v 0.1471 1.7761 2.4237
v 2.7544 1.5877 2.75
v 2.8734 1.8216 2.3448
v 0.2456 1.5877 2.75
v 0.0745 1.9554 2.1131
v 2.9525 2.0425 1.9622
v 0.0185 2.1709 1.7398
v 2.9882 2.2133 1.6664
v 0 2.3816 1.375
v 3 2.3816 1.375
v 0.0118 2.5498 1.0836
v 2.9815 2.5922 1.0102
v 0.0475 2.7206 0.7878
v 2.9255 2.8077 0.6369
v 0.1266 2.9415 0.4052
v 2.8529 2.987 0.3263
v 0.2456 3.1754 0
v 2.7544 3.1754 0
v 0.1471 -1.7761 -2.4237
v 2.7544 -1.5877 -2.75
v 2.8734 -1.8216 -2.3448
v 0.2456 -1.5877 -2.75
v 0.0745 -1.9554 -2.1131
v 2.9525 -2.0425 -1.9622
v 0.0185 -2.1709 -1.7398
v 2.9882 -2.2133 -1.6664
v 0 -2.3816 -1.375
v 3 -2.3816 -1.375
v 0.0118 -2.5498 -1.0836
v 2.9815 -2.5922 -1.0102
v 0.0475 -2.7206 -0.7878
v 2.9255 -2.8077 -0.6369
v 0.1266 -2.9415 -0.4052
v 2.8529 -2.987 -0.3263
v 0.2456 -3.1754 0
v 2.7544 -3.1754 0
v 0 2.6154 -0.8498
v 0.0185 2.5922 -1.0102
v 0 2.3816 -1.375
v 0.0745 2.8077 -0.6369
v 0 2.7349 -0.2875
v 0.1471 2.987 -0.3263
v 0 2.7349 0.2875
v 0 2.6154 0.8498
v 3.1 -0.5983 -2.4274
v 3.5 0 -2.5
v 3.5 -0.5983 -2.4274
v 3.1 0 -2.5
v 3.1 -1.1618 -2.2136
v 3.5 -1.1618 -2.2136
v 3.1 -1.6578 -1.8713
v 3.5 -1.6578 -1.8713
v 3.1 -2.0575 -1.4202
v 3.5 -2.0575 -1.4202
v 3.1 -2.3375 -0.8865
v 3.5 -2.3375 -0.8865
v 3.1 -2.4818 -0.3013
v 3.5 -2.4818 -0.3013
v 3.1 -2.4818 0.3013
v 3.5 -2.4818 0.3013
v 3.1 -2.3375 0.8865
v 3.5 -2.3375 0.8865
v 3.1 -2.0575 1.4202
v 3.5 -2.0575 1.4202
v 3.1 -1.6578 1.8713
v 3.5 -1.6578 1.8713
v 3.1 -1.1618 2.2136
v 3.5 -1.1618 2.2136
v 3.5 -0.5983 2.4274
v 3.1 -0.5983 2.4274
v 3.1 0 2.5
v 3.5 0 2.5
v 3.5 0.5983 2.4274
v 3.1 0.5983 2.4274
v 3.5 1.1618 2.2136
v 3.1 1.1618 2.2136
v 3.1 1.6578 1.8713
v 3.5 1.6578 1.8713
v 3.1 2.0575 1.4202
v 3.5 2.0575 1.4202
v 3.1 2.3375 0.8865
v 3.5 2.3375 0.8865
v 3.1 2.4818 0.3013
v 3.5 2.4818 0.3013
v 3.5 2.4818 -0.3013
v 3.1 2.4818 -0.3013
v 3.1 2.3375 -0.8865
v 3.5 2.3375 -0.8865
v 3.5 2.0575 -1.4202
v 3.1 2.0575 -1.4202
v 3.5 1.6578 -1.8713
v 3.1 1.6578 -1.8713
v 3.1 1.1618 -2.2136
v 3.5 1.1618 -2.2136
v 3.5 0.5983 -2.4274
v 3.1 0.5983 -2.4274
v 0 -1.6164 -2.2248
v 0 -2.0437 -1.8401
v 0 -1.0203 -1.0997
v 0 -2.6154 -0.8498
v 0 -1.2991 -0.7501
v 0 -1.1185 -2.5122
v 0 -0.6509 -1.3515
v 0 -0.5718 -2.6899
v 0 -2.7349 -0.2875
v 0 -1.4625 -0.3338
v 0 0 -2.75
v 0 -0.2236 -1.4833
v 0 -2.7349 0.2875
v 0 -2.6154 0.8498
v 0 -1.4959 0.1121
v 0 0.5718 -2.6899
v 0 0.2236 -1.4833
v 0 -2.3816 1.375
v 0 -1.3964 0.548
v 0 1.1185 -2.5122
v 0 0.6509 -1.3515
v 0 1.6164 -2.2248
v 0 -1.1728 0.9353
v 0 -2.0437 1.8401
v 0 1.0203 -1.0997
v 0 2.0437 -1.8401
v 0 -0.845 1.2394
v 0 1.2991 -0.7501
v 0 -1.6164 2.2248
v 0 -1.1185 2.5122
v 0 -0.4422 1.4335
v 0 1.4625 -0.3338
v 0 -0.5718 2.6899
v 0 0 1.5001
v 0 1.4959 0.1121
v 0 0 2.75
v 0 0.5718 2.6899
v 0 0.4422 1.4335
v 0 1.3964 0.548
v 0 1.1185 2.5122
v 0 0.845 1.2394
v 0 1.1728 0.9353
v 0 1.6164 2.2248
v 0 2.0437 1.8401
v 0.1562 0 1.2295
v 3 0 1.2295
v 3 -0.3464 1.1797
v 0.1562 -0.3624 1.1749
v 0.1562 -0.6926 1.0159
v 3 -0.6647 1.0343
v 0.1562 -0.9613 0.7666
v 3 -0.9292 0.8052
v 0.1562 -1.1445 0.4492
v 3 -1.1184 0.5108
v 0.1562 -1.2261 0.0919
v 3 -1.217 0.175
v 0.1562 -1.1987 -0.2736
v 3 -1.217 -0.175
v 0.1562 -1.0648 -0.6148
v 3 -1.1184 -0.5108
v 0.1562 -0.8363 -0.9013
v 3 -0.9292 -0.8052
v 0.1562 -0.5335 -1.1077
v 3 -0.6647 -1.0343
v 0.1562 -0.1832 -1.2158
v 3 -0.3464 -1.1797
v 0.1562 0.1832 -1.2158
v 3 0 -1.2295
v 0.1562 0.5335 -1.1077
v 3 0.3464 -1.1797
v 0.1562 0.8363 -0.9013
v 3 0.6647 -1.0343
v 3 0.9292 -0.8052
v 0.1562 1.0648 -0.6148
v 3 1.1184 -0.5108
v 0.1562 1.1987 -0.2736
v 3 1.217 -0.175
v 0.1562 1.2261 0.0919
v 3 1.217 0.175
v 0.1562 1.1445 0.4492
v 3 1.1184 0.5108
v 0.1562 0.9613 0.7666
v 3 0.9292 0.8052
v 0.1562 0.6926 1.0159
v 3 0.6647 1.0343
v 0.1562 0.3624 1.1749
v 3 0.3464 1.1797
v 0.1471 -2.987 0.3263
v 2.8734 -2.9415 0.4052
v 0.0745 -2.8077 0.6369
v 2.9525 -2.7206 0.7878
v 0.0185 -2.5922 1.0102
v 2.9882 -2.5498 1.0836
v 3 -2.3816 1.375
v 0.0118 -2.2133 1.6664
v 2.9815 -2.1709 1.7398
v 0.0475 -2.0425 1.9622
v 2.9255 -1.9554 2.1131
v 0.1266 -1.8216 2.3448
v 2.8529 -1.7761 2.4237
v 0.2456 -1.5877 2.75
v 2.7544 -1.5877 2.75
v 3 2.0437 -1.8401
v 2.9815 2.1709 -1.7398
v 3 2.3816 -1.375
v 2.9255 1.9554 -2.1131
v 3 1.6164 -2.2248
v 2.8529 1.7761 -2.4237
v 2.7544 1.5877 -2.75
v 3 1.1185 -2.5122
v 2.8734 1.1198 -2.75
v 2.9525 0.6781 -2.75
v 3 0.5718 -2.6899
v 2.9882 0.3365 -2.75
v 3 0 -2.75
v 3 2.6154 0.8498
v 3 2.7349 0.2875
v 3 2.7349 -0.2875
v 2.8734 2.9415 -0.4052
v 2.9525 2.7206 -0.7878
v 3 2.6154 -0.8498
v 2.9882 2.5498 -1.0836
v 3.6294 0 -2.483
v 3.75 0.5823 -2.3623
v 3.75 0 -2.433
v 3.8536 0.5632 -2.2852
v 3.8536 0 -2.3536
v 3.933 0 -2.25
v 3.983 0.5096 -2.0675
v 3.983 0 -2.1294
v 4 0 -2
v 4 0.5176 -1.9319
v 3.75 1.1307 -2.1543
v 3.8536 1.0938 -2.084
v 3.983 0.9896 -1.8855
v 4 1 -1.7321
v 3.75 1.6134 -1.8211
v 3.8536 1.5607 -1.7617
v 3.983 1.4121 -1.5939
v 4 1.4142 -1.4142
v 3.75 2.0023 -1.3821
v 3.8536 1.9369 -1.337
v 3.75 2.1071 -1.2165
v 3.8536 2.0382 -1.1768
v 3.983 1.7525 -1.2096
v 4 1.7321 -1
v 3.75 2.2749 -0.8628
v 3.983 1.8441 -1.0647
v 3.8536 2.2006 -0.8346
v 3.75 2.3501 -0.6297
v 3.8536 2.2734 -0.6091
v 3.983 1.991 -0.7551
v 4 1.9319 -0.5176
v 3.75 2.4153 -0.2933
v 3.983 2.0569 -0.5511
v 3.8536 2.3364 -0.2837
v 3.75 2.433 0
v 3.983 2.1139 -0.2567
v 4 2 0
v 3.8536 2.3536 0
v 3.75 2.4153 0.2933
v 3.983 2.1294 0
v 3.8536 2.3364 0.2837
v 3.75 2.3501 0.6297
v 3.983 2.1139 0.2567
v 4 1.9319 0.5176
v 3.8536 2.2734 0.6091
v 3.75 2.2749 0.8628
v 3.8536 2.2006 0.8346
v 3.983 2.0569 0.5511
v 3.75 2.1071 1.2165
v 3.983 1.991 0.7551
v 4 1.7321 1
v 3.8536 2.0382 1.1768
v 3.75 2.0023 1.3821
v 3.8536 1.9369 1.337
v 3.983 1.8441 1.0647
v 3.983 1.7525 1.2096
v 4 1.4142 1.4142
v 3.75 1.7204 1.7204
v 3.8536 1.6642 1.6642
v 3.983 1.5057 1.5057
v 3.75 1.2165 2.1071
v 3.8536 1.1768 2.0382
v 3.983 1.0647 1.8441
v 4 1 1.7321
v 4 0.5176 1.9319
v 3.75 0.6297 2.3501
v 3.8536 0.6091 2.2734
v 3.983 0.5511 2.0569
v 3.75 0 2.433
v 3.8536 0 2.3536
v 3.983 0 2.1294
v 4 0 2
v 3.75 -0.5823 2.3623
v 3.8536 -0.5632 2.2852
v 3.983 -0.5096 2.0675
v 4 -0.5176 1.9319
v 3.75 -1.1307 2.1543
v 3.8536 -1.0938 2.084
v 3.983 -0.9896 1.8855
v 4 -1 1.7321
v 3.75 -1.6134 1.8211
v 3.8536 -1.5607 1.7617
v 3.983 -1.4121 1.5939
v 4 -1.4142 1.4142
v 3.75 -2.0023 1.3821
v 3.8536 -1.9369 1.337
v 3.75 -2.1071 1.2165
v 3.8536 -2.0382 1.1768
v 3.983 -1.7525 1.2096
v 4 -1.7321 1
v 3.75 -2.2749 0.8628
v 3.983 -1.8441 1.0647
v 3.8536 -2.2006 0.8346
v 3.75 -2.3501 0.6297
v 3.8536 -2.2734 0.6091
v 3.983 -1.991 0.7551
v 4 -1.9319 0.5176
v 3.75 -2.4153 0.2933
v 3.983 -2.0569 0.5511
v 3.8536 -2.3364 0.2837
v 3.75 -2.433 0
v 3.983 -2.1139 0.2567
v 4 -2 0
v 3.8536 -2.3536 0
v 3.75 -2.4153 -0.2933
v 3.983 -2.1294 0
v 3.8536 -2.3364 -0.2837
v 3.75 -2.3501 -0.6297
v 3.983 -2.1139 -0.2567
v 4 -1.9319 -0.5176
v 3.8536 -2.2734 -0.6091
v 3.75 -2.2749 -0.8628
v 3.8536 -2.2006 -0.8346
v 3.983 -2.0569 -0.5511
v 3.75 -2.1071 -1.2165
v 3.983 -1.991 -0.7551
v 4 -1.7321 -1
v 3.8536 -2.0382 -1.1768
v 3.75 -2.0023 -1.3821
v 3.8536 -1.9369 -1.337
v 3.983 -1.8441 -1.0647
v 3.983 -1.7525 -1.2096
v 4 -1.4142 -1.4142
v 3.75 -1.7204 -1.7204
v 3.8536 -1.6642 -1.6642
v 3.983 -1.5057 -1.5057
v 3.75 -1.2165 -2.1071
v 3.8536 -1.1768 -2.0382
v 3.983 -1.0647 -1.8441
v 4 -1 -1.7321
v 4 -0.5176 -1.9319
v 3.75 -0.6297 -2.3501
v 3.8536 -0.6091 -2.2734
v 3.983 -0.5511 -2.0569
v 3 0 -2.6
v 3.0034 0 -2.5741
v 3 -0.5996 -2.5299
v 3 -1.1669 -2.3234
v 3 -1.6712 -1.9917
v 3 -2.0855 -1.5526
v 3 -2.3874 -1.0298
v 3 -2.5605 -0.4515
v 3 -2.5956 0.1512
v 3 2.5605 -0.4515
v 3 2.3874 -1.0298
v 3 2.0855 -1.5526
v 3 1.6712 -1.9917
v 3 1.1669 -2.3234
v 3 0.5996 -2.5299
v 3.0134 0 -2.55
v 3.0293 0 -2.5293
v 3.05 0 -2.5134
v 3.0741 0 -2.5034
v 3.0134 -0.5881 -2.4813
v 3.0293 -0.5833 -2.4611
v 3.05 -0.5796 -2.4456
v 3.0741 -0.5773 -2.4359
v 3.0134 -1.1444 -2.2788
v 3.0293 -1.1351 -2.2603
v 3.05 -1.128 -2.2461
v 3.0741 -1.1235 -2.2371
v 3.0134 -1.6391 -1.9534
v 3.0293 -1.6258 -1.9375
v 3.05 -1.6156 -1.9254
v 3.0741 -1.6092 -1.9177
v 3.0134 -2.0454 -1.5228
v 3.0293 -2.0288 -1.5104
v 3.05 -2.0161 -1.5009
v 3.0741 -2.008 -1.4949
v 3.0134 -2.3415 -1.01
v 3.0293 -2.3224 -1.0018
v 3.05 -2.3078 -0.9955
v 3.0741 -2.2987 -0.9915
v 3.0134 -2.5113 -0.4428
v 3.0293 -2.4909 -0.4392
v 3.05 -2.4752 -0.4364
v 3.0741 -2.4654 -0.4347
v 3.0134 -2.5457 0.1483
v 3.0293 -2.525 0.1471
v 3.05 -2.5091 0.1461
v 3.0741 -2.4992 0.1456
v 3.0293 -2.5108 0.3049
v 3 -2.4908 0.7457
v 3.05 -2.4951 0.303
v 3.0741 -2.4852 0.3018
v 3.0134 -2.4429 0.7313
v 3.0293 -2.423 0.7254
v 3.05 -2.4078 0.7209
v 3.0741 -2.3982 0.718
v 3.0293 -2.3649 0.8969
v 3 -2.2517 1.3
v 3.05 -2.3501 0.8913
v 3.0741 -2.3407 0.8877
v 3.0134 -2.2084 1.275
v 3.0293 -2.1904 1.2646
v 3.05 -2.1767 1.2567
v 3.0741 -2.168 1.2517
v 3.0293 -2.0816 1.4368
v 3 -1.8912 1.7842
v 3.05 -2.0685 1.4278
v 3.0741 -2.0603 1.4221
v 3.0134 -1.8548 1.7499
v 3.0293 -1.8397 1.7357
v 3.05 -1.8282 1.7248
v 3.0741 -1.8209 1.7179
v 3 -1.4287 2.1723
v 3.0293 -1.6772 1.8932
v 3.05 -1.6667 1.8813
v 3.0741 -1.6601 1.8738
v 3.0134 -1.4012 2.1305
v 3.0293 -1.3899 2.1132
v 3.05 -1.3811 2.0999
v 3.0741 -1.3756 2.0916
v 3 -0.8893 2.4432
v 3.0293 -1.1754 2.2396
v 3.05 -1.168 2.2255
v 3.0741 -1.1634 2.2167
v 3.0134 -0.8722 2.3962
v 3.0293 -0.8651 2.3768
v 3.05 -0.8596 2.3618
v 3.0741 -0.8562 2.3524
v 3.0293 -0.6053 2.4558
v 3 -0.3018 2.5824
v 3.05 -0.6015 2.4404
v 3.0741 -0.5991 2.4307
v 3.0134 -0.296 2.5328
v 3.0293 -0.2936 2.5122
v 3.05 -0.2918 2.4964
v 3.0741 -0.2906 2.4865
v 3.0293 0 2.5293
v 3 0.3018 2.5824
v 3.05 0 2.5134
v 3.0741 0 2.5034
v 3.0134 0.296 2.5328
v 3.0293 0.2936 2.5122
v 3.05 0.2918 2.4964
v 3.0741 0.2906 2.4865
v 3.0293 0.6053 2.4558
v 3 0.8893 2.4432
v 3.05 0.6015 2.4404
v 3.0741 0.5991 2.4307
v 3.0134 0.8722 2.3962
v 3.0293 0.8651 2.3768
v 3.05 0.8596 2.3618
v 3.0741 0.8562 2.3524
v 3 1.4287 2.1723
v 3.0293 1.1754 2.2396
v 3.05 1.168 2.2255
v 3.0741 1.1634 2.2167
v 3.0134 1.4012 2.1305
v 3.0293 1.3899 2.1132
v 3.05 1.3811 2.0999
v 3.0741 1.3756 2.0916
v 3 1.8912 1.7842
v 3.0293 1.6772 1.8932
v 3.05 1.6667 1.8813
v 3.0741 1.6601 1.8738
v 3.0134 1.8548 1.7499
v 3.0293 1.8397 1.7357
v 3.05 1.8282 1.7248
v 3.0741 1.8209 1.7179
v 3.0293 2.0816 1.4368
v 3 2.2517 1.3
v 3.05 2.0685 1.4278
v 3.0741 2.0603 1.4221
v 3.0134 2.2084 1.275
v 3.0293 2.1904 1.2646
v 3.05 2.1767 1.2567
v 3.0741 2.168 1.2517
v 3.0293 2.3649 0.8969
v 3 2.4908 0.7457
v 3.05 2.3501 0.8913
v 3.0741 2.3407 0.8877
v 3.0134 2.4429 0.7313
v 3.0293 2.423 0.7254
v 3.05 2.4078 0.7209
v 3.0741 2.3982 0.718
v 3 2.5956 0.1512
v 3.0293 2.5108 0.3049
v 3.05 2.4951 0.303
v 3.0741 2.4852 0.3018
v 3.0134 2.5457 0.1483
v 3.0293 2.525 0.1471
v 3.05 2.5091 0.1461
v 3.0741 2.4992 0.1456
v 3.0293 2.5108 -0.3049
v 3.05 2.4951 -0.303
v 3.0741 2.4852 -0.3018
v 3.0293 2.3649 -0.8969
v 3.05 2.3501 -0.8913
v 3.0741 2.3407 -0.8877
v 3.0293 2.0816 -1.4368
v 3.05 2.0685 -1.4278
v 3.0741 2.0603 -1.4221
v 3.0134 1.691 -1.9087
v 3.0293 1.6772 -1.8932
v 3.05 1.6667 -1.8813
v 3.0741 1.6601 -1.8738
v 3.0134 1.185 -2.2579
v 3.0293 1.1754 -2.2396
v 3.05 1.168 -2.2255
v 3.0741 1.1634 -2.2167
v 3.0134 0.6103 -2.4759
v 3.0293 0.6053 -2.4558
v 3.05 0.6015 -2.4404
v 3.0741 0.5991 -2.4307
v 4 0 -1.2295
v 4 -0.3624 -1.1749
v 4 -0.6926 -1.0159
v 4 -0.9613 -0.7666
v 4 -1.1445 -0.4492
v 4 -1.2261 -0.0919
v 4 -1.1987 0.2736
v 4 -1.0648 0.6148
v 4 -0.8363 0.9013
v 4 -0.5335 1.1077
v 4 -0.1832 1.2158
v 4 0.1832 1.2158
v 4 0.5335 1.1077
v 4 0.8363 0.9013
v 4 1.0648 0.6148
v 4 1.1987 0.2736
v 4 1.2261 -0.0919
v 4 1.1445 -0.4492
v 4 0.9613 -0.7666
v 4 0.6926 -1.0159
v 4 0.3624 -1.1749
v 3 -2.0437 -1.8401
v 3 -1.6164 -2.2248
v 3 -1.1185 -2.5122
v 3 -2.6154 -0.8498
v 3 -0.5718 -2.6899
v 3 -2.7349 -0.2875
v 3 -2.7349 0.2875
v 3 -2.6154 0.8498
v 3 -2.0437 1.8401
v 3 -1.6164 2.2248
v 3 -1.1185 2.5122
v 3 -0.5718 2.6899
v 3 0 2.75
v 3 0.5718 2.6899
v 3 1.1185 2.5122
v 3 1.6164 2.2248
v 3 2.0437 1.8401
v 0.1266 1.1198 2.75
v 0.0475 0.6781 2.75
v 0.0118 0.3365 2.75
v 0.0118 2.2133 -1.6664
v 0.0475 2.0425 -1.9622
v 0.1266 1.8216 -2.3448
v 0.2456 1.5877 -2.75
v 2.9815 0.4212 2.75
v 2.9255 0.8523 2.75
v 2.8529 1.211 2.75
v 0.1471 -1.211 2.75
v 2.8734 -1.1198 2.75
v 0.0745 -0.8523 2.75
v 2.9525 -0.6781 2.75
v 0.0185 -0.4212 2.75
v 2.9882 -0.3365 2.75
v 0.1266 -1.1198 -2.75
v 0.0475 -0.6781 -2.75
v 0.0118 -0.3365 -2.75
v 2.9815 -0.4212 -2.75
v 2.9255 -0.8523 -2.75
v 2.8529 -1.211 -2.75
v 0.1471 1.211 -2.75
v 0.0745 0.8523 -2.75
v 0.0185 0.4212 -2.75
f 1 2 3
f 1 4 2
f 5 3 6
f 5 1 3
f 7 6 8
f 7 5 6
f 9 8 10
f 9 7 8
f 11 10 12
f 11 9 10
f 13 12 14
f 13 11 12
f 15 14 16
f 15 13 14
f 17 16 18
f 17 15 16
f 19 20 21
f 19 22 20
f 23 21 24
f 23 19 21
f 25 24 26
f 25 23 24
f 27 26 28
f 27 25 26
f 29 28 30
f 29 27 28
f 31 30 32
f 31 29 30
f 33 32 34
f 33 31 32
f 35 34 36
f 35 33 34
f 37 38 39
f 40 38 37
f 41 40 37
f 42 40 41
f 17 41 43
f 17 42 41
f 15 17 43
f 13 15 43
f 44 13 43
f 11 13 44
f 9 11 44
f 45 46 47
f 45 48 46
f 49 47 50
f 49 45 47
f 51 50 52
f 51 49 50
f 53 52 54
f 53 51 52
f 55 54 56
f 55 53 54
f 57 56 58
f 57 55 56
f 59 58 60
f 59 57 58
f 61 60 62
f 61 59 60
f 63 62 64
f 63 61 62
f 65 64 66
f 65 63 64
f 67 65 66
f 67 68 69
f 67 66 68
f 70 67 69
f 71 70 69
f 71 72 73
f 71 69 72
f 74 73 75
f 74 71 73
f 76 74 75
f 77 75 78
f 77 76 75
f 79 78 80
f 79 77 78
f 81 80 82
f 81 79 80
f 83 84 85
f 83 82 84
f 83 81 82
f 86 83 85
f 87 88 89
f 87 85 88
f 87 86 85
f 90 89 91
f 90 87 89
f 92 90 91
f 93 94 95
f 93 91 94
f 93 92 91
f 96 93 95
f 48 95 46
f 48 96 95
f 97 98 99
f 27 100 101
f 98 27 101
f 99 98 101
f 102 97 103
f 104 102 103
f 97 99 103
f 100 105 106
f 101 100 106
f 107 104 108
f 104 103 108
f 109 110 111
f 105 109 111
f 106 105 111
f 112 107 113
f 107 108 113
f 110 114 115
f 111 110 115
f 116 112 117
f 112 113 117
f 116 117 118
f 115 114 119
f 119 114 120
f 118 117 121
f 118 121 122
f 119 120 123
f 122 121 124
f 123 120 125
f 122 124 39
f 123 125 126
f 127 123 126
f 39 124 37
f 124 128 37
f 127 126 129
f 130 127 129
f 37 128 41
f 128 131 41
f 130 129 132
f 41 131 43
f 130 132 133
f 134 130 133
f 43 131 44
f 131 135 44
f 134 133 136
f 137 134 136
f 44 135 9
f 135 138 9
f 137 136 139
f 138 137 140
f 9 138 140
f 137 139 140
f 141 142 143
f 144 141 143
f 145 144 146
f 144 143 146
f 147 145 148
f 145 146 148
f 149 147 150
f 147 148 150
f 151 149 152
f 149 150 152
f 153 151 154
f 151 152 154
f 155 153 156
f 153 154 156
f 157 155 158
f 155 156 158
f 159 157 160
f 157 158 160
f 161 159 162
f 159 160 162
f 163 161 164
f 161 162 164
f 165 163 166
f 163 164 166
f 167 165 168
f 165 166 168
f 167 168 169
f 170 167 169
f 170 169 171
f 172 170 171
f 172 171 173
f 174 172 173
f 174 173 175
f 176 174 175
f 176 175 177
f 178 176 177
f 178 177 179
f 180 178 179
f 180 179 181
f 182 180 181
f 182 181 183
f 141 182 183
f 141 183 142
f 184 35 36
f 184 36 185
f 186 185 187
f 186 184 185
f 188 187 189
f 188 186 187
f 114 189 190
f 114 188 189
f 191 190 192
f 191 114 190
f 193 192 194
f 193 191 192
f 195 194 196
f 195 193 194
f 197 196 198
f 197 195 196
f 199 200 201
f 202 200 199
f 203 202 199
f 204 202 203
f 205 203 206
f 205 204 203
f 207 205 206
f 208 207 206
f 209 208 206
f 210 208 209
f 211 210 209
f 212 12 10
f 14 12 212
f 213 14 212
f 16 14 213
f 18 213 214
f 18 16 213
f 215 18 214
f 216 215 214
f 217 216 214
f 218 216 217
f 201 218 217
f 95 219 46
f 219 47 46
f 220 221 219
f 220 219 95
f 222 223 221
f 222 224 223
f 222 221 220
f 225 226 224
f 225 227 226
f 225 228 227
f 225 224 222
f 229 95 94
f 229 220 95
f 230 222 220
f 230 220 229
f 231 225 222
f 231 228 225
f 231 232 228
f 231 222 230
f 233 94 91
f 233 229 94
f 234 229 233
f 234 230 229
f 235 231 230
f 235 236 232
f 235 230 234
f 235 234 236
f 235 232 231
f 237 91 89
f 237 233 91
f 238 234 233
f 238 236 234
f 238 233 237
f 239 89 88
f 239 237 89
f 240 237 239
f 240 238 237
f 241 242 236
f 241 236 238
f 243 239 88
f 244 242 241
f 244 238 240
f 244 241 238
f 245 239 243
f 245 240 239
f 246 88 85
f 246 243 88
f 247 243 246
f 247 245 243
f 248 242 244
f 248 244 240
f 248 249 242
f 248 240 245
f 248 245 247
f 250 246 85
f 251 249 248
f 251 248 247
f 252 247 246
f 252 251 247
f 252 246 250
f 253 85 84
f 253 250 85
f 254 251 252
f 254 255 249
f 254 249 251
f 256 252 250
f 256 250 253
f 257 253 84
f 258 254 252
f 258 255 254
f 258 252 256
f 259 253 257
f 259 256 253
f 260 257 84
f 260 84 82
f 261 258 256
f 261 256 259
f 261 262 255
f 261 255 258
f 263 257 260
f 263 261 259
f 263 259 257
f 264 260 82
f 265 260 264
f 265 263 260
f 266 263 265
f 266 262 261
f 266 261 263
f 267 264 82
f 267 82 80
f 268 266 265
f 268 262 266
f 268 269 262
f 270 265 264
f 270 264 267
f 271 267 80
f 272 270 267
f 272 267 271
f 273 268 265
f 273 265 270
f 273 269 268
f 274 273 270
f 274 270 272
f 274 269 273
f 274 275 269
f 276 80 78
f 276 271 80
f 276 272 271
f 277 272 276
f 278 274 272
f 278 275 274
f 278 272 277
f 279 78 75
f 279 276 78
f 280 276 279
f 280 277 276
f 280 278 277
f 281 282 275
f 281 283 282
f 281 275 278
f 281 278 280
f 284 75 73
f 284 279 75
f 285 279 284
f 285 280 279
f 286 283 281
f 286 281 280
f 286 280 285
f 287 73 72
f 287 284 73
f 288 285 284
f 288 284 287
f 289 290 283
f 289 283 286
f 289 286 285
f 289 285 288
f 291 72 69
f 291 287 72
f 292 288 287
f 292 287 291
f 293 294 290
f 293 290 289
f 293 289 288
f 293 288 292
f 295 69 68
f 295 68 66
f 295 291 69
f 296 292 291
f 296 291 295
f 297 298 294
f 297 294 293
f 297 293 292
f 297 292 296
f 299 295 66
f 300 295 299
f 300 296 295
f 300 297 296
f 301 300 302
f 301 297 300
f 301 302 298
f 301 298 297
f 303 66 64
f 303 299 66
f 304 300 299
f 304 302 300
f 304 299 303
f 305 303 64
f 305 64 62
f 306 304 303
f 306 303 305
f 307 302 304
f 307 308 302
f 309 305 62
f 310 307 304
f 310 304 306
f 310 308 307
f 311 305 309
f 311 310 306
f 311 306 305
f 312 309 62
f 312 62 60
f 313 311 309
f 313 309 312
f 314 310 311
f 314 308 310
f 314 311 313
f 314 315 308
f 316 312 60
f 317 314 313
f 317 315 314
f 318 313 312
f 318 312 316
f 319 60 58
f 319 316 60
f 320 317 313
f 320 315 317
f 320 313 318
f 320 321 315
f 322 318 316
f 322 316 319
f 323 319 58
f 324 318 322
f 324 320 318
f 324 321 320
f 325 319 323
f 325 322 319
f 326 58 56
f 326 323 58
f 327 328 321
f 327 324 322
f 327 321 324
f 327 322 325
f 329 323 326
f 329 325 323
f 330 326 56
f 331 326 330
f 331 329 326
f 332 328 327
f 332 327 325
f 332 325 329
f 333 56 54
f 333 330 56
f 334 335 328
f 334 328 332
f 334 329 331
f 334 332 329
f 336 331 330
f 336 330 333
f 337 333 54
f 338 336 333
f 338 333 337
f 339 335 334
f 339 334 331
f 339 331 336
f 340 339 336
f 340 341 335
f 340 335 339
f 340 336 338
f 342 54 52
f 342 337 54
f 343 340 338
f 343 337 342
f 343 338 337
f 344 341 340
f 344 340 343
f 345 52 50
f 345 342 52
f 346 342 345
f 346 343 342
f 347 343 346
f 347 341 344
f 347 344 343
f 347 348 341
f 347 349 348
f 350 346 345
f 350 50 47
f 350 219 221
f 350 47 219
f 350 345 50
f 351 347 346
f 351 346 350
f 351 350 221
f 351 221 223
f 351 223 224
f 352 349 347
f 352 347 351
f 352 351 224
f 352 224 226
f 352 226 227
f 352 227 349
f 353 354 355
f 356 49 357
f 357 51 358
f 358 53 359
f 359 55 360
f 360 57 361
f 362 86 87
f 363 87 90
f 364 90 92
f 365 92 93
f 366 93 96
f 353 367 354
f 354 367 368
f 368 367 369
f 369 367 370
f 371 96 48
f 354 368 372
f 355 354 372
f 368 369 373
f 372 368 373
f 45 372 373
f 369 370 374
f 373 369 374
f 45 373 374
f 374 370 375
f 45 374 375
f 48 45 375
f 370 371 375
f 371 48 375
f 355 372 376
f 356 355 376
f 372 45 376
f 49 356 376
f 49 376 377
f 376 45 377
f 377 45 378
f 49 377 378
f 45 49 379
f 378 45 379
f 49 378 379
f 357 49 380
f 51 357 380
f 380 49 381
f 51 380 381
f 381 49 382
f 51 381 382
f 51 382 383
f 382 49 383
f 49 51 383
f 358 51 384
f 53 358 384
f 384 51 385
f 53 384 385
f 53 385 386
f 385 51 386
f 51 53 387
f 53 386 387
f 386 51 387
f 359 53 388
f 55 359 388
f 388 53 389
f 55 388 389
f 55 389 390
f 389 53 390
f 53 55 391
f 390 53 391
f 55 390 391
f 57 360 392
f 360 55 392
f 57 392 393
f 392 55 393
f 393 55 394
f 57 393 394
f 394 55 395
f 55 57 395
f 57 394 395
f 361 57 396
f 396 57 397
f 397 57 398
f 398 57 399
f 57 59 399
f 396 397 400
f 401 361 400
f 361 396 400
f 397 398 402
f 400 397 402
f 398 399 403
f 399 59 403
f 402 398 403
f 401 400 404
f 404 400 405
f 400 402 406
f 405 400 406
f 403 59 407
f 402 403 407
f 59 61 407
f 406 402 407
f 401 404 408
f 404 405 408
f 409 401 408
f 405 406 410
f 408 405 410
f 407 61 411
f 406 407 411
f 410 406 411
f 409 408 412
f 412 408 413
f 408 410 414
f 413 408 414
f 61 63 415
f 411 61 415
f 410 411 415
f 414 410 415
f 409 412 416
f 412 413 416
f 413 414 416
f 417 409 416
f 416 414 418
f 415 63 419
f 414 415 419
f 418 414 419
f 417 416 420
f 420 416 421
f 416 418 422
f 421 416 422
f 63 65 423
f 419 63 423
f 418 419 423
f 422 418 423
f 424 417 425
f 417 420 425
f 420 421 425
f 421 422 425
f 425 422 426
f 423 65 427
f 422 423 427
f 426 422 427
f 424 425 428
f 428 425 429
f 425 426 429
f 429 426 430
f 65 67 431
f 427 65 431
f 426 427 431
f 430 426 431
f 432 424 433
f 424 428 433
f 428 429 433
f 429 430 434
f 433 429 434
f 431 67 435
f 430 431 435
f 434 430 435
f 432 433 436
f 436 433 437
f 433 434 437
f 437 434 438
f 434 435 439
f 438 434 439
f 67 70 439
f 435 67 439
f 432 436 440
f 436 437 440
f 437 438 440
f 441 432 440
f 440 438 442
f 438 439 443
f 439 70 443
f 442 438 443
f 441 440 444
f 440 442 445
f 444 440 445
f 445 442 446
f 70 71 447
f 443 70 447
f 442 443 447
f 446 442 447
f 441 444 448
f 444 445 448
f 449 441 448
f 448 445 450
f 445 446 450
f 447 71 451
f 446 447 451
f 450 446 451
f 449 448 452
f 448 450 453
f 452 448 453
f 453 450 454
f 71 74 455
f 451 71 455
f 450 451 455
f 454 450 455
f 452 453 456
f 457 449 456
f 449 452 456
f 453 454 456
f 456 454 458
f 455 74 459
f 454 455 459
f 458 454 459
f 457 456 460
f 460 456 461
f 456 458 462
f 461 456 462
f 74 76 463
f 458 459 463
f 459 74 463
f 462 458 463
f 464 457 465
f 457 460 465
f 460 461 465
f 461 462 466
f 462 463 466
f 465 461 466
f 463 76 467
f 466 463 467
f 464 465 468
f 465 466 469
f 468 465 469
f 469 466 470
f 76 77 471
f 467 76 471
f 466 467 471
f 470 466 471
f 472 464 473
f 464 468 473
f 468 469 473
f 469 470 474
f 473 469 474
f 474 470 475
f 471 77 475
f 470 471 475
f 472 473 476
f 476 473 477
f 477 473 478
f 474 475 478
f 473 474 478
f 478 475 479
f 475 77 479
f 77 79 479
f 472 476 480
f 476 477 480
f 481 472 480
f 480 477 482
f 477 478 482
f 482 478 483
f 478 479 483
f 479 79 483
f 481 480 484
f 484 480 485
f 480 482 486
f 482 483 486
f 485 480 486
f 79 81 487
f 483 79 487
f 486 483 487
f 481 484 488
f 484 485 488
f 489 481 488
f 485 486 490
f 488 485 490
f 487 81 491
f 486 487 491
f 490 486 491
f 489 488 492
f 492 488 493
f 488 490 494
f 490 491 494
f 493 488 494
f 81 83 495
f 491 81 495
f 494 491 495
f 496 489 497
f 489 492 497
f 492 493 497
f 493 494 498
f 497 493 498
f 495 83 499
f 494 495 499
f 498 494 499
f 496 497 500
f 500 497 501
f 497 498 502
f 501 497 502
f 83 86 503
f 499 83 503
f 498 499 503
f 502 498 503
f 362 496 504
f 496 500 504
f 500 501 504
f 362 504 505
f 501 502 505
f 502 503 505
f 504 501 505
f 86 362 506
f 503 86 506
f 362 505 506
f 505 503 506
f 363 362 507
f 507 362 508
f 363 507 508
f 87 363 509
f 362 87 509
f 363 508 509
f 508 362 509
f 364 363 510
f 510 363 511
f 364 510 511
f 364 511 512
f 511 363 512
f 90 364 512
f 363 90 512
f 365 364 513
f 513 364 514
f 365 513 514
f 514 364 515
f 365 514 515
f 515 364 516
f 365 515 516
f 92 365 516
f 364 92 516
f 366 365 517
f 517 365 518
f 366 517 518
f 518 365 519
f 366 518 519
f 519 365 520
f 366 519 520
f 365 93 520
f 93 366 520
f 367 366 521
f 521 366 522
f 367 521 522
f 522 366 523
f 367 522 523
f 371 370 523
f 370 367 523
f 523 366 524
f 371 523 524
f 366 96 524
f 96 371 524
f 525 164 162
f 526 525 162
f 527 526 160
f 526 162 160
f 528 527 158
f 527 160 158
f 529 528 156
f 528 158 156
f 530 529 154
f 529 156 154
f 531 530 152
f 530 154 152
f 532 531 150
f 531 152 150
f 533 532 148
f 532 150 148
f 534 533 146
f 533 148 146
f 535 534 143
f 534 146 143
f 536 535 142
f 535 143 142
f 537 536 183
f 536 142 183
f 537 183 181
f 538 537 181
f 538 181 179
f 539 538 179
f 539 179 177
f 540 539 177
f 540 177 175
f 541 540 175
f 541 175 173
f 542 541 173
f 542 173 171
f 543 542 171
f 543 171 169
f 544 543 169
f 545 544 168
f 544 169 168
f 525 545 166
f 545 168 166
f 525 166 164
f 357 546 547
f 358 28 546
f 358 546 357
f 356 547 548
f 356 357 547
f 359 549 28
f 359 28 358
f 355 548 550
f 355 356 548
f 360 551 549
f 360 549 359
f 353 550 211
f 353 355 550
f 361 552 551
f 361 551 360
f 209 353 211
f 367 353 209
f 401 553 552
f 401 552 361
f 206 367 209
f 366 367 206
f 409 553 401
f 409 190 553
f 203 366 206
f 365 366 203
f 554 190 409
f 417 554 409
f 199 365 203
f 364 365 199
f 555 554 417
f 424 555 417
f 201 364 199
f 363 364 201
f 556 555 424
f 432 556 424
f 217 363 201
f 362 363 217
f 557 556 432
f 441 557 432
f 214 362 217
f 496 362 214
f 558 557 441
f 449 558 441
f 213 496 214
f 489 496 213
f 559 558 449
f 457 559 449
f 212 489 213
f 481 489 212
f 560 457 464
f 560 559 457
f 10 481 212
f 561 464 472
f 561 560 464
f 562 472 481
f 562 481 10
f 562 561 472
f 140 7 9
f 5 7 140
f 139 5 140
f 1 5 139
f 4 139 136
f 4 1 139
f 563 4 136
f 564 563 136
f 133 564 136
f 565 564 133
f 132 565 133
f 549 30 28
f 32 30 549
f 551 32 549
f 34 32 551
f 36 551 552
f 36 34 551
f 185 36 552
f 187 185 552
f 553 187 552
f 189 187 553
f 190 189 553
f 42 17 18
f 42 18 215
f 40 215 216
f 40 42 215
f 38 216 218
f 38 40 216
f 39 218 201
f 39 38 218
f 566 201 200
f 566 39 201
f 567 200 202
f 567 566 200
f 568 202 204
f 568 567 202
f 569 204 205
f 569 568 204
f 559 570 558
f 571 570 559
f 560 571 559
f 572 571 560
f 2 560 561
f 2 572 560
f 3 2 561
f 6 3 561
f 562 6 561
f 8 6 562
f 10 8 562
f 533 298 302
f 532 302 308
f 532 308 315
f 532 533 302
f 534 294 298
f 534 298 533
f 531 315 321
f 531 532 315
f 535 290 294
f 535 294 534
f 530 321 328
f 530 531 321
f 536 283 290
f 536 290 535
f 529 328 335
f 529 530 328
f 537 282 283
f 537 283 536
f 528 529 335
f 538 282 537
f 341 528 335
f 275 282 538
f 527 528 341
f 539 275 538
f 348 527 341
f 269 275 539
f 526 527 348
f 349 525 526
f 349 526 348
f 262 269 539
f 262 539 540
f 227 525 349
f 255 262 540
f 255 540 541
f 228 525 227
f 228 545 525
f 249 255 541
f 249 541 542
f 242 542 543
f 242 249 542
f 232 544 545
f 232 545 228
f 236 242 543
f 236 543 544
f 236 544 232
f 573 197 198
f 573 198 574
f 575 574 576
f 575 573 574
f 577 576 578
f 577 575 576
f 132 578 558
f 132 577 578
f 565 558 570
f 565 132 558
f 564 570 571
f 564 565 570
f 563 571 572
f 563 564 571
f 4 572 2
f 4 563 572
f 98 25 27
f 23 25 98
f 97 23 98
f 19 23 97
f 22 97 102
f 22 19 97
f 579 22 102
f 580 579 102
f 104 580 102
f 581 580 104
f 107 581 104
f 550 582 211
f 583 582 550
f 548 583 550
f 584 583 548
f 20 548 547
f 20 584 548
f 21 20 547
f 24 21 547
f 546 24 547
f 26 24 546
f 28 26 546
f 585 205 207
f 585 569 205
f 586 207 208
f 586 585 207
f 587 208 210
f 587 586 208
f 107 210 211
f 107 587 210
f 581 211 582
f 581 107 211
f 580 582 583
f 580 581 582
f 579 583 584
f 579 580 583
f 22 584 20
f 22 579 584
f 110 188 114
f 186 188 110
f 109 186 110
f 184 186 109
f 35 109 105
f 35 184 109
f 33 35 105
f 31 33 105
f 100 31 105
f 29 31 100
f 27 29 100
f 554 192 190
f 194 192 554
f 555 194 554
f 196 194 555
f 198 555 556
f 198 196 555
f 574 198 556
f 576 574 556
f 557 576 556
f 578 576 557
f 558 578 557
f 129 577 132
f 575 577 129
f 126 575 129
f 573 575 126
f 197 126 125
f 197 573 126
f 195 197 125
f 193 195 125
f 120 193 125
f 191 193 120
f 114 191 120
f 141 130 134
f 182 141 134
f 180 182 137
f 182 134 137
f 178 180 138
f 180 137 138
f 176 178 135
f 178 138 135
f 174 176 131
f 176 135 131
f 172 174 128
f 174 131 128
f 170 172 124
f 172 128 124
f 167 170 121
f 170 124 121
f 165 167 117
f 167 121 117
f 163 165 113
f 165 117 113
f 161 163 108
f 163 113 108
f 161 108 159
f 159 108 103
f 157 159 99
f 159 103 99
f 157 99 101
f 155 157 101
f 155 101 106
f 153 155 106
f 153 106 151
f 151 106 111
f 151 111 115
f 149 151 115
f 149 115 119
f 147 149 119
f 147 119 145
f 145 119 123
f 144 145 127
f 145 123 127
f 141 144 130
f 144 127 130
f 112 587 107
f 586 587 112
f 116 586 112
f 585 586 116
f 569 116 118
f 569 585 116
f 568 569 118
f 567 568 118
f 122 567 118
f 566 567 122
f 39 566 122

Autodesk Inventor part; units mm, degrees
ref_plane "YZ Plane" through (0, 0, 0) normal (1, 0, 0) x (0, 1, 0)
sketch "Sketch1" plane through (0, 0, 0) normal (1, 0, 0) x (0, 1, 0)
  line L0 (3.1754, 0) -> (1.5877, -2.75)
  line L1 (1.5877, -2.75) -> (-1.5877, -2.75)
  line L2 (-1.5877, -2.75) -> (-3.1754, 0)
  line L3 (-3.1754, 0) -> (-1.5877, 2.75)
  line L4 (-1.5877, 2.75) -> (1.5877, 2.75)
  line L5 (1.5877, 2.75) -> (3.1754, 0)
  point P0 (0, 0)
  point P1 (0, 0)
  dimension "d0" = 6.3509
extrude "Body" add sketch "Sketch1" along normal blind 3
sketch "Sketch2" plane through (0, 0, 0) normal (-1, 0, 0) x (0, 0, 1)
  point P0 (0, 0)
hole "Thread" at (0, 0, 0) direction (1, 0, 0) diameter 2.459 end through all thread size "M3x0.5" class "6H" standard "ISO Metric profile"
chamfer "Chamfer1" distance 0.2706 angle 30 1 edges at (0, 0, -1.2295) measured on face at (0, -1.925, -1.1495)
sketch "Sketch3" plane through (0, 0, 0) normal (0, 0, 1) x (1, 0, 0)
  line L0 (0, 3.1754) -> (3, 3.1754) projected
  line L1 (3, 1.5877) -> (3, 3.1754) projected
  line L2 (-0.48, 0) -> (2.88, 0) projected
  line L3 (2.7544, 3.1754) -> (3, 2.75)
  dimension "d3" = 5.5
  dimension "d4" = 30
revolve "Chamfer3" cut sketch "Sketch3" angle 360 about axis through (-10, 0, 0) along (1, 0, 0)
ref_plane "Work Plane1" through (8.9209, 0, 0) normal (0, 0.8660254, -0.5) x (-1, 0, 0)
ref_plane "Work Plane2" through (1.5, 0, 0) normal (1, 0, 0) x (0, 0, -1)
mirror "Mirror1" about plane through (1.5, 0, 0) normal (1, 0, 0) of "Chamfer3"
sketch "Sketch6" plane through (3, 0, 0) normal (1, 0, 0) x (0, 0, -1)
  circle A0 centre (0, 0) radius 1.2295 projected
  circle A1 centre (0, 0) radius 2.5
  dimension "d26" = 5
extrude "Extrusion2" add sketch "Sketch6" along normal blind 1
fillet "Fillet1" radius 0.5 1 edges at (4, 0, 2.5)
fillet "Fillet2" radius 0.1 1 edges at (3, 0, 2.5)
equation "\"d0\" = 1.1547 * SW"
equation "\"d13\" = -0.5 * GD1 + 0.5 * NND"
equation "\"d21\" = -0.5 * GD1 + 0.5 * NND"
equation "\"d3\" = SW01"
equation "\"d4\" = ANG2"
equation "\"ANG2\" = 30deg"
equation "\"NND\" = 3"
equation "\"KOH\" = 2.4"
equation "\"SW\" = 5.5"
equation "\"SW01\" = SW"
equation "\"GUL\" = 0.541266 * PTC"
equation "\"TOA\" = 30deg"
equation "\"PTC\" = 0.5"
equation "\"E0\" = 1.155 * SW"
equation "\"THREADDIA\" = 3"
equation "\"GAL\" = 0.541266 * PTC"
equation "\"GD1\" = 2.458734"
properties part number "M3 Nylon Nut" material "Stainless Steel"
